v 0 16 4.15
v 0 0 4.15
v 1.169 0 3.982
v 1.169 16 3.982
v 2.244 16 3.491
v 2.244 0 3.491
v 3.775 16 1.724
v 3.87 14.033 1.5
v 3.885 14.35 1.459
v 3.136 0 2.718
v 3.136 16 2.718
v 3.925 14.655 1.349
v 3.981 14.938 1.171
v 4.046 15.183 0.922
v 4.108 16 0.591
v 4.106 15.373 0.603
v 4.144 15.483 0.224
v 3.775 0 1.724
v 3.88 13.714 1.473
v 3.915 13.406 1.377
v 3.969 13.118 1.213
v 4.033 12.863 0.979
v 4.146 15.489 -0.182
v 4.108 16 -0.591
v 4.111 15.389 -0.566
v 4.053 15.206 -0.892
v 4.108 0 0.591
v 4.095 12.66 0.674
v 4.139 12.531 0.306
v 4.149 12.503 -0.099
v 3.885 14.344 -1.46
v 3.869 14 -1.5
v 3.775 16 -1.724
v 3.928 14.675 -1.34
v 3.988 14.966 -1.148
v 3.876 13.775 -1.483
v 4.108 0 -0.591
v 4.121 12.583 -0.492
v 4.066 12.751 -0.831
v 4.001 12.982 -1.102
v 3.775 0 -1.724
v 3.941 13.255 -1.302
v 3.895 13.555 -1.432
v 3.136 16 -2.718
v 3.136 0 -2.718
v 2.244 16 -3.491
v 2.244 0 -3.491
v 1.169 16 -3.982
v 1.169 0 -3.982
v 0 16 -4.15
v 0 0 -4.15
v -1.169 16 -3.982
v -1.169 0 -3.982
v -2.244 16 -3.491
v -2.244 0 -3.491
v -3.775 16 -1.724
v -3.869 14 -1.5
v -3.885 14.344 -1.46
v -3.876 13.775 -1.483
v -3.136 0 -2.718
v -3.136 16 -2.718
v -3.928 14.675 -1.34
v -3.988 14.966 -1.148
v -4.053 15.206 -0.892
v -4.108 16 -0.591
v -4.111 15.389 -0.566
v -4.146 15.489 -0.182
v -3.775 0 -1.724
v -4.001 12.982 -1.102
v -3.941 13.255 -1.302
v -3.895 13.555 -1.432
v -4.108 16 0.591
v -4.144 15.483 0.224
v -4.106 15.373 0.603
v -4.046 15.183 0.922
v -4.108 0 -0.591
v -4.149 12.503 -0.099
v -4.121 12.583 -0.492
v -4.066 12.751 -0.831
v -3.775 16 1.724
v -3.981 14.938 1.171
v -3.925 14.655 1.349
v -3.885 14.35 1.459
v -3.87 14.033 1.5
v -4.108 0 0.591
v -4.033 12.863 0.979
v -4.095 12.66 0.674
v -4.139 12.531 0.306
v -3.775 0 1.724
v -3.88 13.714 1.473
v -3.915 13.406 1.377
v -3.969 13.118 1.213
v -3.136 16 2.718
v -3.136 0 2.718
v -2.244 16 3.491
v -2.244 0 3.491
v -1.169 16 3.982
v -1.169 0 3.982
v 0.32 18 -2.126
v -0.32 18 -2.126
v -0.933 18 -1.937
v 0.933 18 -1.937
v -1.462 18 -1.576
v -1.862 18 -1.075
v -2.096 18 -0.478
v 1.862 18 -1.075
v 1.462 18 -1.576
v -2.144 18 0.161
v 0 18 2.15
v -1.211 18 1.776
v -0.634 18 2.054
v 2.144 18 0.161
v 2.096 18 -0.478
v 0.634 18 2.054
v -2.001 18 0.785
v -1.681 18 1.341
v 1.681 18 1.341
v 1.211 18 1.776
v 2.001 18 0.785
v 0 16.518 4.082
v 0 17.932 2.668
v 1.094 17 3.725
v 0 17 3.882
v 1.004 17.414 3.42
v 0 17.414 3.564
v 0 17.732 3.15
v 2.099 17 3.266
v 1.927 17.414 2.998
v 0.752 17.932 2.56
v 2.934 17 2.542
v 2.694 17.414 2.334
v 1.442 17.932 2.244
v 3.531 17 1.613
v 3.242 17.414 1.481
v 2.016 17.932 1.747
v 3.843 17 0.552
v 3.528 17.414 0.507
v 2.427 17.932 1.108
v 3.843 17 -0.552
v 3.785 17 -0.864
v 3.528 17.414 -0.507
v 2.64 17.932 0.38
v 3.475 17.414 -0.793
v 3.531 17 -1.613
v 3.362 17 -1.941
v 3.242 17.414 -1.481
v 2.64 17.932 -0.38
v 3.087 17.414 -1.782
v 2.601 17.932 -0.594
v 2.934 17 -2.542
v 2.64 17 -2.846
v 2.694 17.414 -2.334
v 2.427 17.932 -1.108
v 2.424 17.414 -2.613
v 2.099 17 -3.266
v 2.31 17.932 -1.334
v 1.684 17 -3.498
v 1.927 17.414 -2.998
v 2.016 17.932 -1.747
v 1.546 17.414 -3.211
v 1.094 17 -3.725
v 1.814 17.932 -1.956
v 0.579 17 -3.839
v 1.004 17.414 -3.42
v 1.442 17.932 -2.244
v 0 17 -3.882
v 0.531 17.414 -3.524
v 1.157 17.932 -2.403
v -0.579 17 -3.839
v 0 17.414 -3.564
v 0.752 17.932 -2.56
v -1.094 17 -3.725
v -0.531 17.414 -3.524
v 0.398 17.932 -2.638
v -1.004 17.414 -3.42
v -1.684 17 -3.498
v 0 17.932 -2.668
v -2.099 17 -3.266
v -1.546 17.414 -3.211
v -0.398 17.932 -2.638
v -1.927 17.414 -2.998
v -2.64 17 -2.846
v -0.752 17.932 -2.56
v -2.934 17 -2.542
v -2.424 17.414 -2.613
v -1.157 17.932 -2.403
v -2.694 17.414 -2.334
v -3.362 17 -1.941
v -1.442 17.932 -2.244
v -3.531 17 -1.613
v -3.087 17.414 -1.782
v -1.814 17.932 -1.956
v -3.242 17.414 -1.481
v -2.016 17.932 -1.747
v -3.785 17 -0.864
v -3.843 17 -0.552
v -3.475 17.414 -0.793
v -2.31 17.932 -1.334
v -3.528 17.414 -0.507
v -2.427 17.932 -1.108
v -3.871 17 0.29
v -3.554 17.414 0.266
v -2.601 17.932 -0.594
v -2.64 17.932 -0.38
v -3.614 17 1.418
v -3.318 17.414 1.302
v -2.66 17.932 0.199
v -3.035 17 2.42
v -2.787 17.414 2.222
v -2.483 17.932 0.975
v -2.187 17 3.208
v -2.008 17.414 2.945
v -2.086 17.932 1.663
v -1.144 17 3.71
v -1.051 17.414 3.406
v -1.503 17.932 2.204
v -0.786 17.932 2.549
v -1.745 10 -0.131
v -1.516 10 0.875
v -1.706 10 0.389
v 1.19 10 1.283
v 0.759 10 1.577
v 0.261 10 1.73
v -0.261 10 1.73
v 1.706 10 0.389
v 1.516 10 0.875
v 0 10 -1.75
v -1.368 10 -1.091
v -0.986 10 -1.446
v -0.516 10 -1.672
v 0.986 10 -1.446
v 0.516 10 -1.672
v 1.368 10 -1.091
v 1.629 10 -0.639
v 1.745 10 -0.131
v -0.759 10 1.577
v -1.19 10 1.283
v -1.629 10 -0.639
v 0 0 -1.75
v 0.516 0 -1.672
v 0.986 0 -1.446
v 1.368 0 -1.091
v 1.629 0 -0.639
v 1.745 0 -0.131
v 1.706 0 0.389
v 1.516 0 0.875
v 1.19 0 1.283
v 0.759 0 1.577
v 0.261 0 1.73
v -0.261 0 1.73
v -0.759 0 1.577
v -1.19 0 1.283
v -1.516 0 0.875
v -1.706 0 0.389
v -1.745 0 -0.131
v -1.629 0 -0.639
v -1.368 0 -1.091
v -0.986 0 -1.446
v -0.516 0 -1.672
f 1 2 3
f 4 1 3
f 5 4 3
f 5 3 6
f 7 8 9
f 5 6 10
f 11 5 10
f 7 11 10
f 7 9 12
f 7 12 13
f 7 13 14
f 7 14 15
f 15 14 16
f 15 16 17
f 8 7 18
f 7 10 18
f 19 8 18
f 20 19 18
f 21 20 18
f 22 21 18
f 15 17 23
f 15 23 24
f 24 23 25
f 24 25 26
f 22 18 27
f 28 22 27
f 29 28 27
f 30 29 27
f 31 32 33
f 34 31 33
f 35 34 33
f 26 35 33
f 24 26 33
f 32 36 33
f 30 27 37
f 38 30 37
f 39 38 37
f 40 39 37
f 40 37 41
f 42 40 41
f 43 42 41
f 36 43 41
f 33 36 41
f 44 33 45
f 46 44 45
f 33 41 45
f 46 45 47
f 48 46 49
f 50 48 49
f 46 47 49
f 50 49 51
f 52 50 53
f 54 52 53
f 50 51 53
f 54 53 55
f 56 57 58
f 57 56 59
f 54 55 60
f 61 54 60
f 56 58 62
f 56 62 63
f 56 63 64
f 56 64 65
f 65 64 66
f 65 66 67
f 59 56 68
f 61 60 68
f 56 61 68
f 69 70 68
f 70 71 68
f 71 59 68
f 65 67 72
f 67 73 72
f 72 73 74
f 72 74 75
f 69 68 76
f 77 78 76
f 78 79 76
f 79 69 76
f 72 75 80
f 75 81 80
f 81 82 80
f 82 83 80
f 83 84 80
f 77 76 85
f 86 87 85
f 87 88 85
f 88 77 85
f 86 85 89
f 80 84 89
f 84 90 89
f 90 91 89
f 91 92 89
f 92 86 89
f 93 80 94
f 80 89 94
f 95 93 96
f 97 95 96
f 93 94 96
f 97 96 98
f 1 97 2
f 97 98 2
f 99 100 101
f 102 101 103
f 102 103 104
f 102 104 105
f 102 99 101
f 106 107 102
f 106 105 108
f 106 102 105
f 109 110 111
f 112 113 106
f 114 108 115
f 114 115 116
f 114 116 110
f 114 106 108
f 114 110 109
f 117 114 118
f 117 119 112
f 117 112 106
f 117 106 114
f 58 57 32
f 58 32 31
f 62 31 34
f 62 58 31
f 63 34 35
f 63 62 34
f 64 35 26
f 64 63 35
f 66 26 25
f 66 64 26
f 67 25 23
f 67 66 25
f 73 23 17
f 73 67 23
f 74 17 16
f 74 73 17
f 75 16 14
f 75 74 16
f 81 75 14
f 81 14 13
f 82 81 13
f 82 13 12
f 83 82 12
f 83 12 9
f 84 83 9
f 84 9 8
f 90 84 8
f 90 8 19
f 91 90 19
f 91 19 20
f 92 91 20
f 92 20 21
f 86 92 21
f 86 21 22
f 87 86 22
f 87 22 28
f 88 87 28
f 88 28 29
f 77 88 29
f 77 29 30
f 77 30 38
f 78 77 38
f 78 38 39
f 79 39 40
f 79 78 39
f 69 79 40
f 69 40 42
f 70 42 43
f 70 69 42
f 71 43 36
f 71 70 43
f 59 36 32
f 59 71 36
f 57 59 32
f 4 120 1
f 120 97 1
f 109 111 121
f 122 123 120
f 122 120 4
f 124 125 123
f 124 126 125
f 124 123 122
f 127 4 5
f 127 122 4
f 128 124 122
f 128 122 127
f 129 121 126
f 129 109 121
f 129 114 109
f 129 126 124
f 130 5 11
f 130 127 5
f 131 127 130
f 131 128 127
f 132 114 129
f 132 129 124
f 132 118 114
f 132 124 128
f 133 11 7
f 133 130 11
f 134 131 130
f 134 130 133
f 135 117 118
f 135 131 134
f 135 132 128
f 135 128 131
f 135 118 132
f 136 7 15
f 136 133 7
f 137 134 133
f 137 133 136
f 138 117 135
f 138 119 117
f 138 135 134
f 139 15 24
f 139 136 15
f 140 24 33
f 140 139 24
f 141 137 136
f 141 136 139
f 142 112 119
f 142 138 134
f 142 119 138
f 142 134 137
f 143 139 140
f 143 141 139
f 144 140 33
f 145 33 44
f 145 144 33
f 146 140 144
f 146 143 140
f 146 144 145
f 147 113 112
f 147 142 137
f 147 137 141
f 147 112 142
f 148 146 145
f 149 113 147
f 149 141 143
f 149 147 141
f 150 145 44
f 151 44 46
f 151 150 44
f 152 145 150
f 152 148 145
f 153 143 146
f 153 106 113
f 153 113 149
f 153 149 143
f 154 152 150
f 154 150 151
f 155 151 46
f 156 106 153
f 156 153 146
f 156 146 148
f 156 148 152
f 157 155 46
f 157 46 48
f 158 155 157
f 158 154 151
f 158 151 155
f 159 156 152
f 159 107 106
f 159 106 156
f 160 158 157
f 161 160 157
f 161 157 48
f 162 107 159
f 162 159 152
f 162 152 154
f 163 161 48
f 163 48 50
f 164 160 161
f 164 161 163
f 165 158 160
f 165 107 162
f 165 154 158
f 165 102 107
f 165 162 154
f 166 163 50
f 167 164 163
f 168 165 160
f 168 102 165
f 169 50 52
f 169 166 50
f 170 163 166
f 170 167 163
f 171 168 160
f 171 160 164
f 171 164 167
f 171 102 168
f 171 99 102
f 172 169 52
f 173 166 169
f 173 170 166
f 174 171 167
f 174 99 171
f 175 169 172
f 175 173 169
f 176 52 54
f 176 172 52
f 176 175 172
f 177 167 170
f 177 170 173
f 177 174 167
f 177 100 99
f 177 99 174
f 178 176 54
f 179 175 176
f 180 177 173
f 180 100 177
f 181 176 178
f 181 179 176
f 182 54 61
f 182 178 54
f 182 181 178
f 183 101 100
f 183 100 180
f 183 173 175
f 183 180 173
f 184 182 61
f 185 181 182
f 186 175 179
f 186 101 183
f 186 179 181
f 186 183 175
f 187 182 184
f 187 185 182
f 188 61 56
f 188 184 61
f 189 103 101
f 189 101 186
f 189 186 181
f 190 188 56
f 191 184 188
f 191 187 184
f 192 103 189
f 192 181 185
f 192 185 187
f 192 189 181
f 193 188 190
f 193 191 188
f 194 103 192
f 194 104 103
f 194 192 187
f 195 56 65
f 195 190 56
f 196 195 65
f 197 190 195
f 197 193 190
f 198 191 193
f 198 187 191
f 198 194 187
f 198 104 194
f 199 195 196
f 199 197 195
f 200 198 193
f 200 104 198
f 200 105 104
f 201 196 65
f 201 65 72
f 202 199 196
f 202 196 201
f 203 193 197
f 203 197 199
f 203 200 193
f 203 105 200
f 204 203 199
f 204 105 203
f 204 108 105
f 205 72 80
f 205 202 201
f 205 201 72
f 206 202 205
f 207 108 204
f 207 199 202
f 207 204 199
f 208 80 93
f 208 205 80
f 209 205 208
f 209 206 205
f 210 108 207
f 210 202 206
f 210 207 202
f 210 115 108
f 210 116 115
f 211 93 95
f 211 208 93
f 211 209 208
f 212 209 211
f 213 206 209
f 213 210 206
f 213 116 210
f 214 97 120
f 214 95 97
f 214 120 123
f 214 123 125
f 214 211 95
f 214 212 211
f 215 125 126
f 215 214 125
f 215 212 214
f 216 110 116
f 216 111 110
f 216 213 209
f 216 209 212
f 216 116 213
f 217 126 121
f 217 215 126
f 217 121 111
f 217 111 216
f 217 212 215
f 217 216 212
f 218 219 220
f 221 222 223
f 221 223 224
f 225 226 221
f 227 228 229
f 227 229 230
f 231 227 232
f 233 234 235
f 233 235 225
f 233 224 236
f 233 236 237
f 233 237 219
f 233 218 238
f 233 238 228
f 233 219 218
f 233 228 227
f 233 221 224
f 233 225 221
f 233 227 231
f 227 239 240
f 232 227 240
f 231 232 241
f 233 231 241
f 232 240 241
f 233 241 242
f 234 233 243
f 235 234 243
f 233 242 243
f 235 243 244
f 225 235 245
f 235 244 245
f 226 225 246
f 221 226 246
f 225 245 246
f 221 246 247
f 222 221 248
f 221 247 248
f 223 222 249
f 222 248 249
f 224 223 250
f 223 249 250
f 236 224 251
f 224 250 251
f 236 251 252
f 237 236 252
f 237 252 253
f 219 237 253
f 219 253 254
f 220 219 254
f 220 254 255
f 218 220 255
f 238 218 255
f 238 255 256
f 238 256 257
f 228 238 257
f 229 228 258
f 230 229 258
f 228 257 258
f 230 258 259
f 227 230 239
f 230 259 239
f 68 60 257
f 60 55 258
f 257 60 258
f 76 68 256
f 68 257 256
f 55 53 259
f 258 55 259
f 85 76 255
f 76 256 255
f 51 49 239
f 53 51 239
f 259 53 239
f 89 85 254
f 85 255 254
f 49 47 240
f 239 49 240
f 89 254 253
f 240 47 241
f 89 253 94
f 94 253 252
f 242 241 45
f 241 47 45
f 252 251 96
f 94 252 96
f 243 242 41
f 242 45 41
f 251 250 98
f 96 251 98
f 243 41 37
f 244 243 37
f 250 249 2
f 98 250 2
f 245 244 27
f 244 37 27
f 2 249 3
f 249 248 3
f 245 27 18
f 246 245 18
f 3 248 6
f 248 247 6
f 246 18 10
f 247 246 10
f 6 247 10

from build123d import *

# Parameters (mm, degrees)
SKETCH2_R               = 4.15
BOSS_EXTRUDE1_DEPTH     = 18
SKETCH3_R               = 1.75
CUT_EXTRUDE1_DEPTH      = 10
CUT_EXTRUDE2_DEPTH      = 19.932643767
CUT_EXTRUDE2_DEPTH_BACK = 19.932643767
SKETCH4_R               = 1.5
FILLET1_R               = 2


with BuildPart() as part:
    # Sketch2 → Boss-Extrude1 (new body)
    with BuildSketch(Plane(origin=(0, 0, 0), x_dir=(1, 0, 0), z_dir=(0, 1, 0))):
        with Locations(Location((0, 0, 0), (0, 0, 270))):
            Circle(SKETCH2_R)
    extrude(amount=BOSS_EXTRUDE1_DEPTH)

    # Sketch3 → Cut-Extrude1 (cut)
    with BuildSketch(Plane.XZ):
        with Locations(Location((0, 0, 0), (0, 0, 270))):
            Circle(SKETCH3_R)
    extrude(amount=-CUT_EXTRUDE1_DEPTH, mode=Mode.SUBTRACT)

    # Sketch4 → Cut-Extrude2 (cut, two sides: drawn at the far end of the back side and taken through both)
    with BuildSketch(Plane(origin=(0, 0, 0), x_dir=(0, 0, -1), z_dir=(1, 0, 0)).offset(-CUT_EXTRUDE2_DEPTH_BACK)):
        with Locations((0, 14)):
            Circle(SKETCH4_R)
    extrude(amount=CUT_EXTRUDE2_DEPTH + CUT_EXTRUDE2_DEPTH_BACK, mode=Mode.SUBTRACT)

    # Fillet1
    fillet1_edges = [part.edges().sort_by_distance(p)[0] for p in [
        (0, 18, -4.15),
    ]]
    fillet(fillet1_edges, radius=FILLET1_R)


solid = part.part
